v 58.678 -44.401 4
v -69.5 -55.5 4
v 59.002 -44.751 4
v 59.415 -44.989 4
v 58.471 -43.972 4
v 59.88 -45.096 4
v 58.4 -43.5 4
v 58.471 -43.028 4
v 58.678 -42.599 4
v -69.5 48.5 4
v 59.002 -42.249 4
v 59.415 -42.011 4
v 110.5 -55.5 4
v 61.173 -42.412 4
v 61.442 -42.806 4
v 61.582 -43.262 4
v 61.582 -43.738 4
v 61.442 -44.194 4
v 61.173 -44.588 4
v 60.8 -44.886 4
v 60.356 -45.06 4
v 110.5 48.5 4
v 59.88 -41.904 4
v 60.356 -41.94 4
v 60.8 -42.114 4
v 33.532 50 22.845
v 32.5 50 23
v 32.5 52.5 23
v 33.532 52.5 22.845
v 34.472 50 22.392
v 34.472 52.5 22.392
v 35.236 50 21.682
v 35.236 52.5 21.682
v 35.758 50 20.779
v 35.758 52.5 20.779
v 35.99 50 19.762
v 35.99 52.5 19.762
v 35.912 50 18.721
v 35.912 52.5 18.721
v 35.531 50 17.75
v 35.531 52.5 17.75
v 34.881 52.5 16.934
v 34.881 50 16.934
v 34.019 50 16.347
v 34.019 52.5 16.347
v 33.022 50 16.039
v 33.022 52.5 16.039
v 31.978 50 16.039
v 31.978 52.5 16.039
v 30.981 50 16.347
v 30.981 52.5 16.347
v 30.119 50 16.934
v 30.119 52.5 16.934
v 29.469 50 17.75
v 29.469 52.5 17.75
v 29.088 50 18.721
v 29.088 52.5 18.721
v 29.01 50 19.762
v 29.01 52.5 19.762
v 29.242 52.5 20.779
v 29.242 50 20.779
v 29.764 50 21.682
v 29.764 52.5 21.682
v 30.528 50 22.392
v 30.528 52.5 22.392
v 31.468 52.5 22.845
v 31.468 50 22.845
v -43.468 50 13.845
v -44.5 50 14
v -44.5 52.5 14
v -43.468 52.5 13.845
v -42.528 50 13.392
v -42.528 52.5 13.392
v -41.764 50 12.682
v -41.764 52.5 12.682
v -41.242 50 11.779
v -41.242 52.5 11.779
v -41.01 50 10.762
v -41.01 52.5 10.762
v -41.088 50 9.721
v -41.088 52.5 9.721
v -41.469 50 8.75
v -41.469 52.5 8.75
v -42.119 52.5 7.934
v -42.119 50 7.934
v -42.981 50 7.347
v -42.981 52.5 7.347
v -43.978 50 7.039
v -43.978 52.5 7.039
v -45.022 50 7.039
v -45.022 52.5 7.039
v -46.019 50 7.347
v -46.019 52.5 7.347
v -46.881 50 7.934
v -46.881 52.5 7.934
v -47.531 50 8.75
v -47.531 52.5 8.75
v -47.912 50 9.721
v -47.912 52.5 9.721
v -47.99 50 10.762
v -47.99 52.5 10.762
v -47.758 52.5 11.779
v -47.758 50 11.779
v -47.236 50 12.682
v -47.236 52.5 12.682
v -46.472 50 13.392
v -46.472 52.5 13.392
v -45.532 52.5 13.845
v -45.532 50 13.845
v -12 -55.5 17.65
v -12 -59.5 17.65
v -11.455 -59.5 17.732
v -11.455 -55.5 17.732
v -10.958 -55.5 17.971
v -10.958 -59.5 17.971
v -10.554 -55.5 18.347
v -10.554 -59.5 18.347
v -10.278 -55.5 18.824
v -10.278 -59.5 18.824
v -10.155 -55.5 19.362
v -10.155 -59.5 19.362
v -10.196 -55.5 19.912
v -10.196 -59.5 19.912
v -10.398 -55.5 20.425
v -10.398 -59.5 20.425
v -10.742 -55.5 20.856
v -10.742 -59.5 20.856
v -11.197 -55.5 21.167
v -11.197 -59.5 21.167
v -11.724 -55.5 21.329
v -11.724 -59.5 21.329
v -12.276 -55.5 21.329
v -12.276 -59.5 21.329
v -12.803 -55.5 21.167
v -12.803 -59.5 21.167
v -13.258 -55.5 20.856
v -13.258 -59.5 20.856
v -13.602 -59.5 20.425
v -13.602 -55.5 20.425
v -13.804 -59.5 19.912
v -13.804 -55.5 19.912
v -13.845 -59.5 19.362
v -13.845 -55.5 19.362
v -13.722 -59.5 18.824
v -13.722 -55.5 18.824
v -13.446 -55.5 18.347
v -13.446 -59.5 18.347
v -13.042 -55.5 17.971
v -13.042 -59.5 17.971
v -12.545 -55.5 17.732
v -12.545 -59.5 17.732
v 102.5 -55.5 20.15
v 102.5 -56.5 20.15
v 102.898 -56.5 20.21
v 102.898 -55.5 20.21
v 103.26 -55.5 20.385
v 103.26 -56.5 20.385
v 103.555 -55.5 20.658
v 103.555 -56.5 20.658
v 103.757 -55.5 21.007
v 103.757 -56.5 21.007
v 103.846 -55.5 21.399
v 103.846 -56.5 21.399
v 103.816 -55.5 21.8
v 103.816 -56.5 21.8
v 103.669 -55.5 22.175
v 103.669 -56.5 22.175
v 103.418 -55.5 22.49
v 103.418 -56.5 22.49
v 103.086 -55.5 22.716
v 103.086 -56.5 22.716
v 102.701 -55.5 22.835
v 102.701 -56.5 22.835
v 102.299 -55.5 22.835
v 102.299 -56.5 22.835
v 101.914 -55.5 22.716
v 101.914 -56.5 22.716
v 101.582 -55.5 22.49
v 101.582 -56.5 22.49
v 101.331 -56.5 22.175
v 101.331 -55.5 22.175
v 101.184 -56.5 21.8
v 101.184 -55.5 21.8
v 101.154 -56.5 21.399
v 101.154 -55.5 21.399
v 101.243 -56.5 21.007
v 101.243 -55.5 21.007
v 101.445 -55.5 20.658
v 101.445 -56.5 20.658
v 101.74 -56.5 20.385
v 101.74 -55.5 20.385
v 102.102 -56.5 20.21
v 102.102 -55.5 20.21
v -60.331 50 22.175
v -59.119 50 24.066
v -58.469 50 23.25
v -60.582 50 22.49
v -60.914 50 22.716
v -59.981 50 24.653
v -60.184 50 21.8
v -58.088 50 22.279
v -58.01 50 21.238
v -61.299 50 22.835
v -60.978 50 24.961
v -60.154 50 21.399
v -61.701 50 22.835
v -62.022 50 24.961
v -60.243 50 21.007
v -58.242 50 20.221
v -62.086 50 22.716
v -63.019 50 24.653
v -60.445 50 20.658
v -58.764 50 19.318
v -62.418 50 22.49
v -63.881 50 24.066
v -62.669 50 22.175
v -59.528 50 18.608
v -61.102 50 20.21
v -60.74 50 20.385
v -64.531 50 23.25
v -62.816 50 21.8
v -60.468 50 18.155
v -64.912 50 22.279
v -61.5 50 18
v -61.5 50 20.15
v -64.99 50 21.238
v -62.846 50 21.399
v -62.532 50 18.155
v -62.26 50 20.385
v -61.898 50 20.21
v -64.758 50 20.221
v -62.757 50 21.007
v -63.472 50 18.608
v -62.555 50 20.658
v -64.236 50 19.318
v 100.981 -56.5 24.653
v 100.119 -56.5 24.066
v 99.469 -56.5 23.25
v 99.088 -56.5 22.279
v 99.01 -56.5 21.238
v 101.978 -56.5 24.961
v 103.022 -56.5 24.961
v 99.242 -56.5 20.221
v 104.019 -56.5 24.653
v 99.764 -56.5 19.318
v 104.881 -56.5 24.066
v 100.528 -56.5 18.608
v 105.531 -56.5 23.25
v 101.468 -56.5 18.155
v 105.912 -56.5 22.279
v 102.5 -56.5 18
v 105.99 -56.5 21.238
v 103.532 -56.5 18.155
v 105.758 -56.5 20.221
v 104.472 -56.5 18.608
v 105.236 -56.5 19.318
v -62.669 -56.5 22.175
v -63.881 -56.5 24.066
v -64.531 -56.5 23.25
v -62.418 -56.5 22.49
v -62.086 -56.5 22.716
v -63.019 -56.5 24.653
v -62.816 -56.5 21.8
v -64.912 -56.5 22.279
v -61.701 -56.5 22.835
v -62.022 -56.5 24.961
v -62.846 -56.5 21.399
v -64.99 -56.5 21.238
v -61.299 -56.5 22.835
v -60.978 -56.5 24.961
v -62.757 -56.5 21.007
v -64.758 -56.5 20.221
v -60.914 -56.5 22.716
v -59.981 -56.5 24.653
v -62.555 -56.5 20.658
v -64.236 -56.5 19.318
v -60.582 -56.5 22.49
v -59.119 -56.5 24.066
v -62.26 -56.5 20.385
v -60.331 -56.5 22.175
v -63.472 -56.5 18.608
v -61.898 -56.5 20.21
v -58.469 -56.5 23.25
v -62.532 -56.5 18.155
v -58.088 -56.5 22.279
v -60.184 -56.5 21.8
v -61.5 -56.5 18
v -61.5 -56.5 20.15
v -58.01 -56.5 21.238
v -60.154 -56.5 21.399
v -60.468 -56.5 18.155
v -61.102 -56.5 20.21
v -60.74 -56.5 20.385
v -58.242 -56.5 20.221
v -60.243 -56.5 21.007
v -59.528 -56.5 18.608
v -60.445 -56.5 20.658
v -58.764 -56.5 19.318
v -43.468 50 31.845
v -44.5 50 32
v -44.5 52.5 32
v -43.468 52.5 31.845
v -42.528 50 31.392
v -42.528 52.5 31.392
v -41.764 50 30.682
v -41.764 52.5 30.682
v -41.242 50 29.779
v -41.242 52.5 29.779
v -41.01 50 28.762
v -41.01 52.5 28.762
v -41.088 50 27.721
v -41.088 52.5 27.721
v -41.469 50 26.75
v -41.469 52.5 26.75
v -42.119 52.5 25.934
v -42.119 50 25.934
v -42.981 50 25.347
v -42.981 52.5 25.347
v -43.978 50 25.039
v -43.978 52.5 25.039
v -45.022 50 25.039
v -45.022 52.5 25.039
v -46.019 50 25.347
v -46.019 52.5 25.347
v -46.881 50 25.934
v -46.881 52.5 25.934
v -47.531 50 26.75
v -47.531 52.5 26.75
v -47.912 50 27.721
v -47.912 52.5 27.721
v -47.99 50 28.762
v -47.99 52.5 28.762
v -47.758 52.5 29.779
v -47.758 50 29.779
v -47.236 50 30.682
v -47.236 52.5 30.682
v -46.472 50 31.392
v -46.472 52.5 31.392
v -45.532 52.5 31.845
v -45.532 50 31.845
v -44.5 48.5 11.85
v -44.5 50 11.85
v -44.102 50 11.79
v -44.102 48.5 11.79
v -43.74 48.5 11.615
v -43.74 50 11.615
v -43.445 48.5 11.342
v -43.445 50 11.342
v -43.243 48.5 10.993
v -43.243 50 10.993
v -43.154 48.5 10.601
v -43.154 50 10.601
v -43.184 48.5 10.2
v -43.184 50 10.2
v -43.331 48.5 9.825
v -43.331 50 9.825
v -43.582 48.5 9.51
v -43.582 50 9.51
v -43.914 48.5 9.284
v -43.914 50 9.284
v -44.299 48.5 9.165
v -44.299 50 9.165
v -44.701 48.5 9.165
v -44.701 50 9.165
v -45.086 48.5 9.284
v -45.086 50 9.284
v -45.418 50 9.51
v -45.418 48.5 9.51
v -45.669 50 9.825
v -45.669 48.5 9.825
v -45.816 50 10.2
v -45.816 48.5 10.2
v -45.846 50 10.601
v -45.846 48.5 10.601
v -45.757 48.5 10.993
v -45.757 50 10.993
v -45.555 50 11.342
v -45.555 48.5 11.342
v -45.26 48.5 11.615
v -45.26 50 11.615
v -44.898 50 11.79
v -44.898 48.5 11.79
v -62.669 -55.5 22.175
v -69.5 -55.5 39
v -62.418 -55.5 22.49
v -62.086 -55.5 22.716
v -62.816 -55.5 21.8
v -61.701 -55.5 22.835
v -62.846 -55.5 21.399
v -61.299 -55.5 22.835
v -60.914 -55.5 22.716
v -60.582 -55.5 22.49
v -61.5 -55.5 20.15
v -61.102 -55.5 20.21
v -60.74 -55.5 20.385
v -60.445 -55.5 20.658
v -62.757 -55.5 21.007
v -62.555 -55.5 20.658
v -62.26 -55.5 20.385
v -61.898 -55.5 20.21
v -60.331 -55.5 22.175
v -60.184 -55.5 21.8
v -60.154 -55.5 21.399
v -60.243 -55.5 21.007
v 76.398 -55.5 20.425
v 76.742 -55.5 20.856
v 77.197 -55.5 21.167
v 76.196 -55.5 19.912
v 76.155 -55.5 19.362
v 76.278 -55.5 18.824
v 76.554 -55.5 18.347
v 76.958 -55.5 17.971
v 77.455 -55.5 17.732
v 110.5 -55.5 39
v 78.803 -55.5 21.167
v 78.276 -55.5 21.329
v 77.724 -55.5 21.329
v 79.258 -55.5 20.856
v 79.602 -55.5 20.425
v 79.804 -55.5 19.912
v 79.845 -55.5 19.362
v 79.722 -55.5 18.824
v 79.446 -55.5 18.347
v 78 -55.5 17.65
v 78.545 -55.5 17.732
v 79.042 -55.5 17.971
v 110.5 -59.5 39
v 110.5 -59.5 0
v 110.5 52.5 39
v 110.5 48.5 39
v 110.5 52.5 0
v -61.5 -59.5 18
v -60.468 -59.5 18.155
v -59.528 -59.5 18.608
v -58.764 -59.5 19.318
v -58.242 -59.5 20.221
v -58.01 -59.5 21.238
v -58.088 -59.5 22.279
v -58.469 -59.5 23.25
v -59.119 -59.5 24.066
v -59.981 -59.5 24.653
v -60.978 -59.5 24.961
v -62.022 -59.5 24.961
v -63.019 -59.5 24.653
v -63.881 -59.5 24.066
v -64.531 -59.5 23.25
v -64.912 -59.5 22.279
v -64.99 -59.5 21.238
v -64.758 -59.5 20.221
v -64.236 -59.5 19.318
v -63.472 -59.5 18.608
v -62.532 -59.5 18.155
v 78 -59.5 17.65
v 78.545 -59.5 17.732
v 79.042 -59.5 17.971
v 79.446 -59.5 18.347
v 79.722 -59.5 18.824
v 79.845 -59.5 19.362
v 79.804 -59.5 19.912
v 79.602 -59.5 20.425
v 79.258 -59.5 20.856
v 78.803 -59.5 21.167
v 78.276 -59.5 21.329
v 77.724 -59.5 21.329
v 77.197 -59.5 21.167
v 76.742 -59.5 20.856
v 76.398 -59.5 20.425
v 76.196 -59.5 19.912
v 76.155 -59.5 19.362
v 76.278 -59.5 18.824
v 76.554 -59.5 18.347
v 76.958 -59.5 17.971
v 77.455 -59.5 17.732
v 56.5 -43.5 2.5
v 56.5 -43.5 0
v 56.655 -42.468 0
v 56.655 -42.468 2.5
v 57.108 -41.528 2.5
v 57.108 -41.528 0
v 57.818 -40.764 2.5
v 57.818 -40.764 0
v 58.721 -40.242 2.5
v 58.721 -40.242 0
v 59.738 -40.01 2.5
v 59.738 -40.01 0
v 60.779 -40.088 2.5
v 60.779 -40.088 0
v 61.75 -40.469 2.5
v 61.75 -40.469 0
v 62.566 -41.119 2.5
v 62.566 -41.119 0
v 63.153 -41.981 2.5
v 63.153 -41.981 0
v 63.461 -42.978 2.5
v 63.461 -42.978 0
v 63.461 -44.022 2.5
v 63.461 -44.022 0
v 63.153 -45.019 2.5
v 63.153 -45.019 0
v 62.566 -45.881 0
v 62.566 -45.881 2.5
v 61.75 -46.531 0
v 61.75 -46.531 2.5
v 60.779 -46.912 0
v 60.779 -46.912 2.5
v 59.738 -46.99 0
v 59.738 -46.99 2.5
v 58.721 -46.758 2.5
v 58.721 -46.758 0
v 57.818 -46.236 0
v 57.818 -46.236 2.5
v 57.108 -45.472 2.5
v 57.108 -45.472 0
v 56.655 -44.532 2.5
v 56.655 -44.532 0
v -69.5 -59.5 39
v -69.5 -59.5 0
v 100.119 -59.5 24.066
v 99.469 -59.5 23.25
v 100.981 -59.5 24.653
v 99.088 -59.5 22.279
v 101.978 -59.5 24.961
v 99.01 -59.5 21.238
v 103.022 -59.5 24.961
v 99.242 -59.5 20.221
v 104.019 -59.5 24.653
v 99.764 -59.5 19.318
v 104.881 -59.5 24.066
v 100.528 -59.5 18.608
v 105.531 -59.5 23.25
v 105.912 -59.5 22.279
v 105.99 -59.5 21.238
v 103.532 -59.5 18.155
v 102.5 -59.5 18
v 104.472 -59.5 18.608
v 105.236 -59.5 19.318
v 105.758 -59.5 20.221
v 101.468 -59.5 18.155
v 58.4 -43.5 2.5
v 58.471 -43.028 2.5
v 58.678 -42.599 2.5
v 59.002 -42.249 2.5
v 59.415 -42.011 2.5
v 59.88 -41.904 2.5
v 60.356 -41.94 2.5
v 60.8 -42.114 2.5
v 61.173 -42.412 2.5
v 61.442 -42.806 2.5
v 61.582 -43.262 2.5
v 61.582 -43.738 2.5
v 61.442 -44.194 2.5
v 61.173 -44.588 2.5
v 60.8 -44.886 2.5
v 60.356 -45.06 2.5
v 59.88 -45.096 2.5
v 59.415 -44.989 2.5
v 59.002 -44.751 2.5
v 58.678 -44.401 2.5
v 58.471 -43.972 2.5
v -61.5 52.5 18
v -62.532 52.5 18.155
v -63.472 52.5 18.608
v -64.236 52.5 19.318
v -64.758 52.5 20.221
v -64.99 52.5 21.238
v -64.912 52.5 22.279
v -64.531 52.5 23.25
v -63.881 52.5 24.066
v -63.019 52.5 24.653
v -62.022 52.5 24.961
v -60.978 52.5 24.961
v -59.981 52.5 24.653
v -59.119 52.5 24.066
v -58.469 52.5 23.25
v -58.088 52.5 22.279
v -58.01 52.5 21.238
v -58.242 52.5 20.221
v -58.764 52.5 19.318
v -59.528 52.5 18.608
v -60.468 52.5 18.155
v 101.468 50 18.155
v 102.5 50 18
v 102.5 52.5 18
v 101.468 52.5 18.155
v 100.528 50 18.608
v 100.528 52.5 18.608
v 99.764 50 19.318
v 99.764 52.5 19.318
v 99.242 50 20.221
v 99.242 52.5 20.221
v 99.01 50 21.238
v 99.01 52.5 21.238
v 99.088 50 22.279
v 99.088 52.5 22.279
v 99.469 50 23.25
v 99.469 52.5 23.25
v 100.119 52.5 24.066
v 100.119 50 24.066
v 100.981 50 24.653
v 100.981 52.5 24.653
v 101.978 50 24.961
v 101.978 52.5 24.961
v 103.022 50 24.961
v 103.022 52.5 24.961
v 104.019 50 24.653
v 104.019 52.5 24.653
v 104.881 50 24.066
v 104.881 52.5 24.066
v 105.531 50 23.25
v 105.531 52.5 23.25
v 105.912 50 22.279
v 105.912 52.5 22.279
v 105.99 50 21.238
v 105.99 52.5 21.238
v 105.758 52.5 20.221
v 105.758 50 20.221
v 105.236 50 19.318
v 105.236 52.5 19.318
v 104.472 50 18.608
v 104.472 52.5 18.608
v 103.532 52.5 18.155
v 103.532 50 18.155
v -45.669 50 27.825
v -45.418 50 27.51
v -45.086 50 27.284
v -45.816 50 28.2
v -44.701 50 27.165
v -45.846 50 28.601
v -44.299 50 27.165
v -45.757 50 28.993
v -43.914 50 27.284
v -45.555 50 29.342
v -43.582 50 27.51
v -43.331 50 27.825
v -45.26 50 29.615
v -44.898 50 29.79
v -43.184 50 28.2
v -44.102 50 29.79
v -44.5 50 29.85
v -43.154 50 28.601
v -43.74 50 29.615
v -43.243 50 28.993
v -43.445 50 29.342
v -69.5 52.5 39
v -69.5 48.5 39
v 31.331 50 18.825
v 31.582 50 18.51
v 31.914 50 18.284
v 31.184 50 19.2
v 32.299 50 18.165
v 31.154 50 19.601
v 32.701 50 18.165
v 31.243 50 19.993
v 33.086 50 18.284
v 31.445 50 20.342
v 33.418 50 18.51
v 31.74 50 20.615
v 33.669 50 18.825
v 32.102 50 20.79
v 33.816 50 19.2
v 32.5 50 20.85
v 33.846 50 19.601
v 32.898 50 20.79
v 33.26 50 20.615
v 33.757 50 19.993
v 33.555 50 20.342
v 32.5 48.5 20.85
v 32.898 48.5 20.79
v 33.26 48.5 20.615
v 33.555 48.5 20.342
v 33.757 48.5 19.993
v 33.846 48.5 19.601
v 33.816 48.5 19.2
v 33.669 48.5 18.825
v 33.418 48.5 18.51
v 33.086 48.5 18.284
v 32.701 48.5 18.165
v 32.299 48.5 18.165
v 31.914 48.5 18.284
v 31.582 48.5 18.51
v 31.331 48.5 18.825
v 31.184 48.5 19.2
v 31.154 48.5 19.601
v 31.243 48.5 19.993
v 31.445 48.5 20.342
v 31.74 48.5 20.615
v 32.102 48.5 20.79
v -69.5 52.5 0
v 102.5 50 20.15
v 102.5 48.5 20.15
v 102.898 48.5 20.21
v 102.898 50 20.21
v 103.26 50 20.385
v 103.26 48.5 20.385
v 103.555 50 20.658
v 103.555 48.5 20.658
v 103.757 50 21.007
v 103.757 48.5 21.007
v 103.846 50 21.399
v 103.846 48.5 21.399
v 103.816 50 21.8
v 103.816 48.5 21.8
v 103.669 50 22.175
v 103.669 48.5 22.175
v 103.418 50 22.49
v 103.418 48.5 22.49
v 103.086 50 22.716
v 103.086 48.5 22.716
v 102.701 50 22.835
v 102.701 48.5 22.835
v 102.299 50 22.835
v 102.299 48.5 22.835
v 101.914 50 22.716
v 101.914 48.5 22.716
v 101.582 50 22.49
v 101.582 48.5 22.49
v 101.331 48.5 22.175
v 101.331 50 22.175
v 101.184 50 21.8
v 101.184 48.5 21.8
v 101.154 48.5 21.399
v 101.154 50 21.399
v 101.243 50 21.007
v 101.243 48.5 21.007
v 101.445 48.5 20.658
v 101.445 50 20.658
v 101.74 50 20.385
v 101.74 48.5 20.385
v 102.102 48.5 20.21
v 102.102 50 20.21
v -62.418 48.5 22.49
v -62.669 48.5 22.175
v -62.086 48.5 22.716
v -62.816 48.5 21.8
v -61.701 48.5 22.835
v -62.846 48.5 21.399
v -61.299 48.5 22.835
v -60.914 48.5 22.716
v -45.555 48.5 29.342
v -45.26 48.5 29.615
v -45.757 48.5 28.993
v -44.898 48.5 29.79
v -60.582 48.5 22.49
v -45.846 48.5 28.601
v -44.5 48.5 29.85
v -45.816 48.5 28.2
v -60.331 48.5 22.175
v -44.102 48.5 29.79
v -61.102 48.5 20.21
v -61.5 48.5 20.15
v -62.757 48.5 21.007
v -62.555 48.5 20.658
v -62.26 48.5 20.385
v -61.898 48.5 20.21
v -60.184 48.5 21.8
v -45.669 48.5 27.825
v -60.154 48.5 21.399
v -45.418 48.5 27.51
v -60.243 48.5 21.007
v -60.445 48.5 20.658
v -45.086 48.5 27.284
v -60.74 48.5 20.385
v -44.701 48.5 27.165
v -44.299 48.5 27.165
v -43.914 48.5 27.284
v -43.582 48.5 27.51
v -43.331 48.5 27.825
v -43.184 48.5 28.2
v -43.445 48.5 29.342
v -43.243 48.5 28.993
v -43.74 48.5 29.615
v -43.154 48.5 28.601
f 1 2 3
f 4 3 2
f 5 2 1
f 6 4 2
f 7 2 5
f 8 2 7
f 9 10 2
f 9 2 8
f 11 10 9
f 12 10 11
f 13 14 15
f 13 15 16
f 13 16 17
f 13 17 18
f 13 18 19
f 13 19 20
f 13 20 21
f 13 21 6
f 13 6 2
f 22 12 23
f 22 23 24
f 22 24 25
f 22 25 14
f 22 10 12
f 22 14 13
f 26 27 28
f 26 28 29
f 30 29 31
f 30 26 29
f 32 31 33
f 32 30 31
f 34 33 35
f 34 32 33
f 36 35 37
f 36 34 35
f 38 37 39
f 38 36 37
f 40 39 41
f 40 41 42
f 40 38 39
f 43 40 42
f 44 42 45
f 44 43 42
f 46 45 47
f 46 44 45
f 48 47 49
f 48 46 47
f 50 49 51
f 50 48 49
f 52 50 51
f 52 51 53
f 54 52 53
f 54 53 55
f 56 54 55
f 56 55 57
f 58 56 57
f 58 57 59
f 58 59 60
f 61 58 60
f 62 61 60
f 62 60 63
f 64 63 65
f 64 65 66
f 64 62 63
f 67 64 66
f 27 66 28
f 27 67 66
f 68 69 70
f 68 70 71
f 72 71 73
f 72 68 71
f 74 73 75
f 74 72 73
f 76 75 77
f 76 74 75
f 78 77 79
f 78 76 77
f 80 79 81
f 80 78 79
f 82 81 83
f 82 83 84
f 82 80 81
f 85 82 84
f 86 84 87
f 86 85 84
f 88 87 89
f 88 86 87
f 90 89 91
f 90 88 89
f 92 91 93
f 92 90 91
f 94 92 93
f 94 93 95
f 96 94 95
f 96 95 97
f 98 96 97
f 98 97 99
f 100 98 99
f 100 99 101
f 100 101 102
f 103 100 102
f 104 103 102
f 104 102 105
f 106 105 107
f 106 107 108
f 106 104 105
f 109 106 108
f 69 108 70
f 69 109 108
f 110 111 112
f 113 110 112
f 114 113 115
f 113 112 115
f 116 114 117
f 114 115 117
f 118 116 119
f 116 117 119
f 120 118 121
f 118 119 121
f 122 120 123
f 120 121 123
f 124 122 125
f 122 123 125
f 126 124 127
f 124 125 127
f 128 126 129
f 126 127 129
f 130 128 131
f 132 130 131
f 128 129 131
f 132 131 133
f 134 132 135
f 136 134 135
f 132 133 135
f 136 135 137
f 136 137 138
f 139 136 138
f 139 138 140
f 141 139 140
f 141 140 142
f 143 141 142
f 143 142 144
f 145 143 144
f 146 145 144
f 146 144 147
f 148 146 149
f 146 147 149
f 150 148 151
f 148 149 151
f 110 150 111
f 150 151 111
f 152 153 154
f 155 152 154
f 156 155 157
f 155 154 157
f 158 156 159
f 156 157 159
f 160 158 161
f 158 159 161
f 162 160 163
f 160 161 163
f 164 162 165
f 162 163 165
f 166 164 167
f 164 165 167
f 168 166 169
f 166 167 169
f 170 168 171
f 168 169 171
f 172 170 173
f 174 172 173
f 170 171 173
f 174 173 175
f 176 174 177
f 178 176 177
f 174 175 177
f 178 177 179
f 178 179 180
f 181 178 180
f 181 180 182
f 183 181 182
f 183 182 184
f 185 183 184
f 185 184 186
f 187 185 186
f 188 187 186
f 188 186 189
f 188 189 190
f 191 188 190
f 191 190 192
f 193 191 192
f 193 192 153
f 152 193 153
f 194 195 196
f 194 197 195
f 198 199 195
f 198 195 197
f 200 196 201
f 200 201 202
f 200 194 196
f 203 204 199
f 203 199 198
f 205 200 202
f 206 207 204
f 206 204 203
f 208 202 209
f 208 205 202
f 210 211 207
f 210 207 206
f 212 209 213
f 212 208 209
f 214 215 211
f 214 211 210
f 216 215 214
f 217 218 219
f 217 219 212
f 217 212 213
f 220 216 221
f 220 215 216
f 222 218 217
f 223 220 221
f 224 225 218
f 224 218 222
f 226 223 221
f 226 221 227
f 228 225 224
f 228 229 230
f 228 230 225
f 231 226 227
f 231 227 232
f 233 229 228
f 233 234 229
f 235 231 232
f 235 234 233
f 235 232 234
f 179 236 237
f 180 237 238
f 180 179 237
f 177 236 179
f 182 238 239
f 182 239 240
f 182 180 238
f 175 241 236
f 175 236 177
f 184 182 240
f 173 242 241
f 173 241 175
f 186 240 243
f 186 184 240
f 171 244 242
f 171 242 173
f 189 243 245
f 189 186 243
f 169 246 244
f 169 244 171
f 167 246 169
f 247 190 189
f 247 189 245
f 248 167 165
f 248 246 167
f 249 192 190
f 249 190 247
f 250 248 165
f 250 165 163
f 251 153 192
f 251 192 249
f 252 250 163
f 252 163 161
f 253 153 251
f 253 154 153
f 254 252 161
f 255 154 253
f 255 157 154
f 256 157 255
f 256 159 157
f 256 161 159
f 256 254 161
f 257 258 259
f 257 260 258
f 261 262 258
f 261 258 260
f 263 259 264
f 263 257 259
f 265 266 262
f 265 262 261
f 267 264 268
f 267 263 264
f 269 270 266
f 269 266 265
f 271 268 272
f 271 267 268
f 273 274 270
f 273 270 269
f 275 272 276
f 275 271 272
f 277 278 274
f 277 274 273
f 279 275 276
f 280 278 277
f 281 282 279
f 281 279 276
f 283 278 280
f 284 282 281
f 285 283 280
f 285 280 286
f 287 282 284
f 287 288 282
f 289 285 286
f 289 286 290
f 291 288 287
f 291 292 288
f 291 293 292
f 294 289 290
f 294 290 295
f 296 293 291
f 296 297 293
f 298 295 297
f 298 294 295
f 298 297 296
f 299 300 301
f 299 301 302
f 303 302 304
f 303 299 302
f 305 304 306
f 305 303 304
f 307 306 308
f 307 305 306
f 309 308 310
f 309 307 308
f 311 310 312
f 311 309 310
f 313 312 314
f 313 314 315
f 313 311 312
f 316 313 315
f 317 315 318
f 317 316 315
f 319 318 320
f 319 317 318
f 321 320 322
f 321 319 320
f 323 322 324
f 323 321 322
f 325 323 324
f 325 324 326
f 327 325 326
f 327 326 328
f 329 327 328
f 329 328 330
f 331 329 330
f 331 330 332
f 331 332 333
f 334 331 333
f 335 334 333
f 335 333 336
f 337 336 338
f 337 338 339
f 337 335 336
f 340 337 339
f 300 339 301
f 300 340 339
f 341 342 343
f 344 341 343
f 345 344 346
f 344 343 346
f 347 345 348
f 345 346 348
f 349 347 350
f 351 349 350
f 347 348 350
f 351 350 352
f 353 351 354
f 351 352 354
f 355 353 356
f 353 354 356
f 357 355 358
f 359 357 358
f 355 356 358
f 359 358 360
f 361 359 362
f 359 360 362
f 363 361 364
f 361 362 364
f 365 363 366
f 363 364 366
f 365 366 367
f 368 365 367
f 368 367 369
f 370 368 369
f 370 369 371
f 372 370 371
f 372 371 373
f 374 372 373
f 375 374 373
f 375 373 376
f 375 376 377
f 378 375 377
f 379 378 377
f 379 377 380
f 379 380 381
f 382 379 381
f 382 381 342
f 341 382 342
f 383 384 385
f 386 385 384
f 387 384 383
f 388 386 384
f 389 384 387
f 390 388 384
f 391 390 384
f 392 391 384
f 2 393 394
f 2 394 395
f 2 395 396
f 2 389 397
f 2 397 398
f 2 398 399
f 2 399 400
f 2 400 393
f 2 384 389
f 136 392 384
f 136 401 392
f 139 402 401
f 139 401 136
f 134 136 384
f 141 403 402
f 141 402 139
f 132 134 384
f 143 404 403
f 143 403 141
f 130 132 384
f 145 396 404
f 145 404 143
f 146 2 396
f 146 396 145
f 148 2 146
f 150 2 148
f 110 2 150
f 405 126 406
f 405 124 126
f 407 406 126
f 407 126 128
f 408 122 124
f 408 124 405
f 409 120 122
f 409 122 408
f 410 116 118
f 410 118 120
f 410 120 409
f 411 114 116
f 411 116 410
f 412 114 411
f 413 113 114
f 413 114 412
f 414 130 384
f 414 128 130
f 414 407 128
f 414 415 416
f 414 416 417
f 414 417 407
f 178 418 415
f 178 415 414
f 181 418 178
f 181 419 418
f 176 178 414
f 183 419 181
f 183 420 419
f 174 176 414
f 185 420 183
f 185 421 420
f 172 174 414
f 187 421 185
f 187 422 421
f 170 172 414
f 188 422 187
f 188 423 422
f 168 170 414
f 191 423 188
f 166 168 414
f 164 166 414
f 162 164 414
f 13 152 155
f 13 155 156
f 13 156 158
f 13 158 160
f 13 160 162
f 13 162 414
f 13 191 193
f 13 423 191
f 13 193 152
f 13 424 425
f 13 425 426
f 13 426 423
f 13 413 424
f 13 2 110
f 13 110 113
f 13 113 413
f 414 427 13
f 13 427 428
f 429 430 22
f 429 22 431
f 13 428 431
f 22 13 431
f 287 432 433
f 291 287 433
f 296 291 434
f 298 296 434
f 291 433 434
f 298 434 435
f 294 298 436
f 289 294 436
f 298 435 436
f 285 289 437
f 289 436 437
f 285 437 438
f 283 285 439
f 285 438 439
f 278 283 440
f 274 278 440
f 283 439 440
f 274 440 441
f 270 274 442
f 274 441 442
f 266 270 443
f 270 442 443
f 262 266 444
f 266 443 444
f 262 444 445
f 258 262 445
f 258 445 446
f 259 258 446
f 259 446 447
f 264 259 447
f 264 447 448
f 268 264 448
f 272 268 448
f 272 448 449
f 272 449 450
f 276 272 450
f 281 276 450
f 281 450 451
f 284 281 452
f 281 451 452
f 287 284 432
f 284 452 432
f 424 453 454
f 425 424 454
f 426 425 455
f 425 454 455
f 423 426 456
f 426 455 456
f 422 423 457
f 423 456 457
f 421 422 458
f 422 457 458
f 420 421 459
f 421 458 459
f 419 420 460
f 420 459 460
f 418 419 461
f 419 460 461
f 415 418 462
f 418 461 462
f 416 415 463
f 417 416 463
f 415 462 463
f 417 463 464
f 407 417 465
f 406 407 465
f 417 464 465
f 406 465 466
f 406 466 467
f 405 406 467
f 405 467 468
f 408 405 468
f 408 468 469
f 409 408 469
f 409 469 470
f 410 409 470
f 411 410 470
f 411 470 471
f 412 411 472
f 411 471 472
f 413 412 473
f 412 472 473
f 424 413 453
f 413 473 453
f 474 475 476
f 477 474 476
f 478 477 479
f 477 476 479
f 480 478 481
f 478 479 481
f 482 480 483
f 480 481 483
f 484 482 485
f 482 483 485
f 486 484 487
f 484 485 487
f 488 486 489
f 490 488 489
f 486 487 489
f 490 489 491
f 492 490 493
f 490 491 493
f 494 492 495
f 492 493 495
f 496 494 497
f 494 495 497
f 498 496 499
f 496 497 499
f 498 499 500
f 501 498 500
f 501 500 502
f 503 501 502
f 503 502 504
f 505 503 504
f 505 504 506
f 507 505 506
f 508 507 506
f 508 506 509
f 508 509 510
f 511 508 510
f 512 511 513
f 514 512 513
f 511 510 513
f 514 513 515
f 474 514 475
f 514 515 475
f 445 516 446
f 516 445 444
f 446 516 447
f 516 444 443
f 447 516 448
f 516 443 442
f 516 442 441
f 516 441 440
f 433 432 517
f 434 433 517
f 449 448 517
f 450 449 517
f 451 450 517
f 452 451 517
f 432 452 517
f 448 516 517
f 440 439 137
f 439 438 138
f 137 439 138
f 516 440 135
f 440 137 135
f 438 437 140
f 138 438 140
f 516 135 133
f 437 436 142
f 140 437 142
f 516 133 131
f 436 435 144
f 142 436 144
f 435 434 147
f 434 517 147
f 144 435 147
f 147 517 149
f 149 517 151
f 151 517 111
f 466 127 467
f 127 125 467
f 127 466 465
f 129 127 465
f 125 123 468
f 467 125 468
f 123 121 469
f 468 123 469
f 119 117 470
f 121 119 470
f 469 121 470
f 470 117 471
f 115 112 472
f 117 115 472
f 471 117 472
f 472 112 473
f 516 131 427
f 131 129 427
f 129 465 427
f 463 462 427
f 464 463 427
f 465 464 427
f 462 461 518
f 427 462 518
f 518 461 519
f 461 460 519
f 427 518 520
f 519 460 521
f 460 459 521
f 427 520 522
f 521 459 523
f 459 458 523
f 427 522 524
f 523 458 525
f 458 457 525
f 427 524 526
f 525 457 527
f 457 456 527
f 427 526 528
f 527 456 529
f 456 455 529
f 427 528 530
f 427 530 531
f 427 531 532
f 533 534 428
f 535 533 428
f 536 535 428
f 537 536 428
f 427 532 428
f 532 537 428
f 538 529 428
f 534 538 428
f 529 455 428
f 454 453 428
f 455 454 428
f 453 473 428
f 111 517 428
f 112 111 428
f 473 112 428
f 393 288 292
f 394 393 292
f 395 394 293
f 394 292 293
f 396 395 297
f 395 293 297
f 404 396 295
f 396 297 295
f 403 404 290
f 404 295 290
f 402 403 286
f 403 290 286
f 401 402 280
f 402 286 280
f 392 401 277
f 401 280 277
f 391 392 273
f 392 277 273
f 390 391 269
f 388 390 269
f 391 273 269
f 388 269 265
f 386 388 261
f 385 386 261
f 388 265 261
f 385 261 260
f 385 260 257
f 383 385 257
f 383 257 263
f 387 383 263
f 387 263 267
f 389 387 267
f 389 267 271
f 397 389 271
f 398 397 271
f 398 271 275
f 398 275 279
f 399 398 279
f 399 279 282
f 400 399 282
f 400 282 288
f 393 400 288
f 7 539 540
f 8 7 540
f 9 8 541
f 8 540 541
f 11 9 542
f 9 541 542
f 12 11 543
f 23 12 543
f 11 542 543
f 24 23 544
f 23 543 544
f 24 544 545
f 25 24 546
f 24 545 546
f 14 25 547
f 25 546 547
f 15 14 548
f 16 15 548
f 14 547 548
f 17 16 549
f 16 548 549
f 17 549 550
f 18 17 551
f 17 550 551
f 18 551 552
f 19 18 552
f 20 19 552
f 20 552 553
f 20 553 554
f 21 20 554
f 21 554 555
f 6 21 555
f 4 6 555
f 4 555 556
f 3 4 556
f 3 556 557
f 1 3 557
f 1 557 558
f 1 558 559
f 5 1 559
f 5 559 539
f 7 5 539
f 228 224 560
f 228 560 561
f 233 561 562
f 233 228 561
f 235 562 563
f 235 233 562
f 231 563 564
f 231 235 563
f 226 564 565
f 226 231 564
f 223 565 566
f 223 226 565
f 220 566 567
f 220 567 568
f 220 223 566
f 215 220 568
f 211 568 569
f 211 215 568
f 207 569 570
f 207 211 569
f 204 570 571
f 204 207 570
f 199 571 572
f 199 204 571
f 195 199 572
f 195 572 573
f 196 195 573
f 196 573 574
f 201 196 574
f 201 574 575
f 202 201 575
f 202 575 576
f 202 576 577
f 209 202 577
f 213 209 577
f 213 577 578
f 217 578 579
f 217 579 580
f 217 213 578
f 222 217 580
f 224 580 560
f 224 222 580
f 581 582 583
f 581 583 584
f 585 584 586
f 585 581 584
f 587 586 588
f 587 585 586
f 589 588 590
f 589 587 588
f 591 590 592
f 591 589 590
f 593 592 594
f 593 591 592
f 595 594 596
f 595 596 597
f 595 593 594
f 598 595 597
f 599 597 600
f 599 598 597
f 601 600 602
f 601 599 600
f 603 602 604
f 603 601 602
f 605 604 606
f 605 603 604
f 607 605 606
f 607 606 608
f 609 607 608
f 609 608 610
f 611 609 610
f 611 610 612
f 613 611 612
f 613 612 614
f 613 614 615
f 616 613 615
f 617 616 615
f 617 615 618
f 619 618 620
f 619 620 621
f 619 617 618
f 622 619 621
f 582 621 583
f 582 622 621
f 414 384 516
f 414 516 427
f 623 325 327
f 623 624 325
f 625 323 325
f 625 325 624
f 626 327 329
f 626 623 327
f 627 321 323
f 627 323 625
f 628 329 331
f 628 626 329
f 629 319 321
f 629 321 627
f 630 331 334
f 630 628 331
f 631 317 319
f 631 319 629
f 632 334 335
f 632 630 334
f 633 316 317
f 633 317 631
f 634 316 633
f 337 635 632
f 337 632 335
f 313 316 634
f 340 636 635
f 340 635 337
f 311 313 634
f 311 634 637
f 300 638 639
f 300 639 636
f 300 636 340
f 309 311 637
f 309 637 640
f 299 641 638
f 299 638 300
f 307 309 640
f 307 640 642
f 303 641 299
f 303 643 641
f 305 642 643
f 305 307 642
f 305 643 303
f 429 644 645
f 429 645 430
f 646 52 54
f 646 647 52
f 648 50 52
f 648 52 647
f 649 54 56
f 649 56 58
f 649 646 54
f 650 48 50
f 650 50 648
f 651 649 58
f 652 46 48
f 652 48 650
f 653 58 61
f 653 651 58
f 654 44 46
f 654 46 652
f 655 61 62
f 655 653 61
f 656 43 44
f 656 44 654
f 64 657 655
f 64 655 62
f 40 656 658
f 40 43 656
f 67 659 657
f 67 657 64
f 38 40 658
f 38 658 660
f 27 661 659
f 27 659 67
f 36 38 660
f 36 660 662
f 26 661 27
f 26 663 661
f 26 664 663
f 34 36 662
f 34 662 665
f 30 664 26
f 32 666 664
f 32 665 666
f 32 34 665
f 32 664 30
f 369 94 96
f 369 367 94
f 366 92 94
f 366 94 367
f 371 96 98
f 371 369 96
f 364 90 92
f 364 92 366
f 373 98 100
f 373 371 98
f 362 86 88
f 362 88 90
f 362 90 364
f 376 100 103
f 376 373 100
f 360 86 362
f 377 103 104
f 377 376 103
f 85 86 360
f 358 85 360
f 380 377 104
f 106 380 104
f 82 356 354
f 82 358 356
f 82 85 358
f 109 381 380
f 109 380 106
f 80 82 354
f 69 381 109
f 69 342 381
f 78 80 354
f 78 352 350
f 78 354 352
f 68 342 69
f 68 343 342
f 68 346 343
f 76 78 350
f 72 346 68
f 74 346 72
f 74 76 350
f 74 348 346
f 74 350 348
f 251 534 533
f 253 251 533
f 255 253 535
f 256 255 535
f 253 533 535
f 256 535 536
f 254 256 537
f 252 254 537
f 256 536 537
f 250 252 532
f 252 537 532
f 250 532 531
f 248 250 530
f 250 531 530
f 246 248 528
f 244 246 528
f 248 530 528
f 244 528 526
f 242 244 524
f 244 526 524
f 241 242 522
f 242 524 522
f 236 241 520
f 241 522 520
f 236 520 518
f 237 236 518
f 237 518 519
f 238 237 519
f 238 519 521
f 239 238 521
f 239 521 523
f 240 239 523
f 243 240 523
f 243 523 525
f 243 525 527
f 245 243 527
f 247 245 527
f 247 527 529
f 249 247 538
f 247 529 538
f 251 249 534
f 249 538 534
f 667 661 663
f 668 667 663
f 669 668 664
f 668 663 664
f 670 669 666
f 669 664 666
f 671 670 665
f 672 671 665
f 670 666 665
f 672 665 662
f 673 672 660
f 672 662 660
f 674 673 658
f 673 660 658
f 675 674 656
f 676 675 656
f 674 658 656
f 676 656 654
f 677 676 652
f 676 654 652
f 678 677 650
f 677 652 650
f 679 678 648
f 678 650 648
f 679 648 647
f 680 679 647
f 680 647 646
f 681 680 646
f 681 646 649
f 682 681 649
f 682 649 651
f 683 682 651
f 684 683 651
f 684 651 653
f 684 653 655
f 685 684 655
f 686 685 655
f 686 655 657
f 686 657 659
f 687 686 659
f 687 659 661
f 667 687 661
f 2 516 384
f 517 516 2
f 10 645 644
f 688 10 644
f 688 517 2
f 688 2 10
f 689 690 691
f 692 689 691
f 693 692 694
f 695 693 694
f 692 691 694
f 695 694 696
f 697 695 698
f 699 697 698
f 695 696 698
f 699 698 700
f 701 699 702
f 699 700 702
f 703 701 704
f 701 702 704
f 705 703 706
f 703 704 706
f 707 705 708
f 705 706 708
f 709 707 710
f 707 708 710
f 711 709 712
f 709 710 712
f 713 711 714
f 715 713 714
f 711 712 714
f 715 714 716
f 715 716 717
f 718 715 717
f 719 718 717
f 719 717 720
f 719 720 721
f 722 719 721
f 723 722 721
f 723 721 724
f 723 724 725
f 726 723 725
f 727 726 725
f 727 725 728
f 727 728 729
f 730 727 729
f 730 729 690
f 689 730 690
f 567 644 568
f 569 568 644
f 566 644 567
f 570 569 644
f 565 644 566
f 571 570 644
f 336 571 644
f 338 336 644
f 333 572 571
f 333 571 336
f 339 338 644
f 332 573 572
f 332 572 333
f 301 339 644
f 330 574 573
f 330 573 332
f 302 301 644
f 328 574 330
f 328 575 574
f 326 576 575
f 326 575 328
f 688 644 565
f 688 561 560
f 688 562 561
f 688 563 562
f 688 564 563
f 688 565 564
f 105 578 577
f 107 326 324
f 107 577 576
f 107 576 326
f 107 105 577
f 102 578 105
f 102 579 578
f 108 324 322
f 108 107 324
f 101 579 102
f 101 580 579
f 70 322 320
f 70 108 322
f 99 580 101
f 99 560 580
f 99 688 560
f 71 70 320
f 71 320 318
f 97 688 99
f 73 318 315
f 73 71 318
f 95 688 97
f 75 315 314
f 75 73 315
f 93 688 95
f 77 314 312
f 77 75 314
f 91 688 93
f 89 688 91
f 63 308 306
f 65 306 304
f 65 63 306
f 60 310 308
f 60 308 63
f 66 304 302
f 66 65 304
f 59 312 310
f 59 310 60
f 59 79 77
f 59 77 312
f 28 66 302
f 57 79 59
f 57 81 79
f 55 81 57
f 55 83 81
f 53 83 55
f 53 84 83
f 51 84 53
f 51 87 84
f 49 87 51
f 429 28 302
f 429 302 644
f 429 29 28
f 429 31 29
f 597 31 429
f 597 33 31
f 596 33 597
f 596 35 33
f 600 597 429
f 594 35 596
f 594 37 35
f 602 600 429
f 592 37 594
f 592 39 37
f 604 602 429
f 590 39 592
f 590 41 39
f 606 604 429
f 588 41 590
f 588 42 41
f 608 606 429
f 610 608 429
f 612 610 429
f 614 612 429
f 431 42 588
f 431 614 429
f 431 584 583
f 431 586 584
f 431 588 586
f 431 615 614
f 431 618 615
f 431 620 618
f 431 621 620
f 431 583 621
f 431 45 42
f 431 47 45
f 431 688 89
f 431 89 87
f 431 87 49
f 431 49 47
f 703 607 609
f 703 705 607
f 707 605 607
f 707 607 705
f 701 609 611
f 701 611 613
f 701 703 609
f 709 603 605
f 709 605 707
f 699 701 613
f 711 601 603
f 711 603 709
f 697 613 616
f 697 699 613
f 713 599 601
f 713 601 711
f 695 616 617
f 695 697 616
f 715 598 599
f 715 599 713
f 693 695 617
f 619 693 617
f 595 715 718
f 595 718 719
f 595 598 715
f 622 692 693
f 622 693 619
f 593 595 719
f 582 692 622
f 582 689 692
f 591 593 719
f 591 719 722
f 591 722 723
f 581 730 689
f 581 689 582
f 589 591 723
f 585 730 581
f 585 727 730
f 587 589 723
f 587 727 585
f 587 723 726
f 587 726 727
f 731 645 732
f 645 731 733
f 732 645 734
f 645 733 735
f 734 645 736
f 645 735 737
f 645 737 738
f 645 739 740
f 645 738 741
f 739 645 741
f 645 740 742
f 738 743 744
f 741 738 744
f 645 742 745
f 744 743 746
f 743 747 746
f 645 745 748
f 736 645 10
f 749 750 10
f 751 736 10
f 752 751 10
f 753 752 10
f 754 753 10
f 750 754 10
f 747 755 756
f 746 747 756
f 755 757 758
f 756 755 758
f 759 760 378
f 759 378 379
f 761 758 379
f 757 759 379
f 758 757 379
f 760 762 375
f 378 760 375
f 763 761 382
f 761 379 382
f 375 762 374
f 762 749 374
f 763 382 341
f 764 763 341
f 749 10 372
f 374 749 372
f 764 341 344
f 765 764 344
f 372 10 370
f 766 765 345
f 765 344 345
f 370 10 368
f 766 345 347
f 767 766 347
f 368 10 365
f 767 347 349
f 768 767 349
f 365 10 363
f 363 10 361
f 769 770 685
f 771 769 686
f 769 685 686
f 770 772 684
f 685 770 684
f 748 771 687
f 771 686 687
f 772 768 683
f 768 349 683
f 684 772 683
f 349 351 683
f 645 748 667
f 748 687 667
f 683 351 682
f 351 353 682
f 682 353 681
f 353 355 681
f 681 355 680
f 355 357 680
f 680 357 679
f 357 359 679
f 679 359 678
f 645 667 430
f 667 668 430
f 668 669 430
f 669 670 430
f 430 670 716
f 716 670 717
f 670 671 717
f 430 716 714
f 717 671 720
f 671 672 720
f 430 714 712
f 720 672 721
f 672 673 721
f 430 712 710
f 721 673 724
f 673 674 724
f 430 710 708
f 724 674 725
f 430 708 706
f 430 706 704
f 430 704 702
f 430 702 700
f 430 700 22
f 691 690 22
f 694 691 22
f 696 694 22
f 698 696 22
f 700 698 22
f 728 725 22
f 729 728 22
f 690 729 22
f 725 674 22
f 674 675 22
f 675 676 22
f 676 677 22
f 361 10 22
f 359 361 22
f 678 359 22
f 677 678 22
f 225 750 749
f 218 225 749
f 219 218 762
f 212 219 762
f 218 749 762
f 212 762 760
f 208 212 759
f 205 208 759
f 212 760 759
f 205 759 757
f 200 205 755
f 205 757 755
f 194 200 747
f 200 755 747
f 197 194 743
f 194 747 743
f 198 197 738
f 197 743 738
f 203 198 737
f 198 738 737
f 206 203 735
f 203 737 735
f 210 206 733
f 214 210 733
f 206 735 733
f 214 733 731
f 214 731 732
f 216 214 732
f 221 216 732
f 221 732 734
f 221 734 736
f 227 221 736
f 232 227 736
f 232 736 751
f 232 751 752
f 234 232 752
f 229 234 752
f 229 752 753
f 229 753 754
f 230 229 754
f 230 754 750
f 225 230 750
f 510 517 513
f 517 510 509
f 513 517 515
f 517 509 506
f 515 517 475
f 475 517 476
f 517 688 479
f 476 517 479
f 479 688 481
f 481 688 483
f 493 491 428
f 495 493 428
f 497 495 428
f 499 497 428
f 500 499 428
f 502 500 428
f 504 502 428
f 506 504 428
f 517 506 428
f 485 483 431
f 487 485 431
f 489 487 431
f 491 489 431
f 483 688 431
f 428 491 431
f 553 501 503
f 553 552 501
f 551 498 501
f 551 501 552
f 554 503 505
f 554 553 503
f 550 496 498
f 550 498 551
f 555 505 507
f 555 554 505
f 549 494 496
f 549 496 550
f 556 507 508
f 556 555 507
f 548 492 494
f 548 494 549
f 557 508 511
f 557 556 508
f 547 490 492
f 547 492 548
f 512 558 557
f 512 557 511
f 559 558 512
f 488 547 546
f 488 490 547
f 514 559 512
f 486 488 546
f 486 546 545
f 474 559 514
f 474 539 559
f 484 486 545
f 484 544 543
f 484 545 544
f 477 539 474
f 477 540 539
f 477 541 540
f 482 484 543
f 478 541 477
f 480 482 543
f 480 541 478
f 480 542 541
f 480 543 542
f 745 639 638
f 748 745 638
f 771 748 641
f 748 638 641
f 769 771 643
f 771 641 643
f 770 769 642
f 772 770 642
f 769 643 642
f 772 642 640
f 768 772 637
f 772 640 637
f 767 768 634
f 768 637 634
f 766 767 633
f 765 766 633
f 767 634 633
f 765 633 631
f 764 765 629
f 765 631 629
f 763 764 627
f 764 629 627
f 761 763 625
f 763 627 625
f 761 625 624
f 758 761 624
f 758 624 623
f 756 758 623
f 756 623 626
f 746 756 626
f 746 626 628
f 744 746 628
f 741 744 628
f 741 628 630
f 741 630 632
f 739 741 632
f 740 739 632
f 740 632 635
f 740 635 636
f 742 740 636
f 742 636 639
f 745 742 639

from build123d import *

# Parameters (mm, degrees)
SKICA1_W                 = 180
SKICA1_H                 = 112
P_IDAT_VYSUNUT_M1_DEPTH  = 4
SKICA3_W                 = 180
SKICA3_H                 = 4
P_IDAT_VYSUNUT_M2_DEPTH  = 35
SKICA4_R                 = 1.35
ODEBRAT_VYSUNUT_M1_DEPTH = 4
ODEBRAT_VYSUNUT_M2_REACH = 164.096
SKICA6_R                 = 1.35
SKICA7_R                 = 3.5
ODEBRAT_VYSUNUT_M3_DEPTH = 3
SKICA8_R                 = 1.85
ODEBRAT_VYSUNUT_M4_DEPTH = 4
ODEBRAT_START            = -2.5
SKICA9_R                 = 3.5
ODEBRAT_VYSUNUT_M5_DEPTH = 2.5
SKICA10_R                = 1.6
ODEBRAT_VYSUNUT_M6_DEPTH = 4
SKICA11_R                = 3.5
ODEBRAT_VYSUNUT_M7_DEPTH = 2.5


with BuildPart() as part:
    # Skica1 → Přidat vysunutím1 (new body)
    with BuildSketch(Plane.XY):
        with Locations((20.5, -3.5)):
            Rectangle(SKICA1_W, SKICA1_H)
    extrude(amount=P_IDAT_VYSUNUT_M1_DEPTH)

    # Skica3 → Přidat vysunutím2 (add)
    with BuildSketch(Plane.XY.offset(4)):
        with Locations((20.5, 50.5)):
            Rectangle(SKICA3_W, SKICA3_H)
        with Locations((20.5, -57.5)):
            Rectangle(SKICA3_W, SKICA3_H)
    extrude(amount=P_IDAT_VYSUNUT_M2_DEPTH)

    # Skica4 → Odebrat vysunutím1 (cut)
    with BuildSketch(Plane(origin=(0, 52.5, 0), x_dir=(1, 0, 0), z_dir=(0, 1, 0))):
        with Locations(Location((32.5, -19.5, 0), (0, 0, 270))):
            Circle(SKICA4_R)
        with Locations(Location((-44.5, -10.5, 0), (0, 0, 270))):
            Circle(SKICA4_R)
        with Locations(Location((-44.5, -28.5, 0), (0, 0, 270))):
            Circle(SKICA4_R)
    extrude(amount=-ODEBRAT_VYSUNUT_M1_DEPTH, mode=Mode.SUBTRACT)

    # Odebrat vysunutím2: up to this face of the body (flat: up to its plane)
    odebrat_vysunut_m2_end = Plane(part.part.faces().sort_by_distance((20.596477546, 52.5, 19.5))[0])
    # Skica6 → Odebrat vysunutím2 (cut, up to the picked face)
    with BuildSketch(Plane.XZ.offset(59.5), mode=Mode.PRIVATE) as odebrat_vysunut_m2_sk1:
        with Locations(Location((102.5, 21.5, 0), (0, 0, 270))):
            Circle(SKICA6_R)
    odebrat_vysunut_m2_tool1 = split(extrude(odebrat_vysunut_m2_sk1.sketch, amount=-ODEBRAT_VYSUNUT_M2_REACH, mode=Mode.PRIVATE), bisect_by=odebrat_vysunut_m2_end, keep=Keep.BOTH, mode=Mode.PRIVATE)
    # Skica6 → Odebrat vysunutím2 (cut, up to the picked face)
    with BuildSketch(Plane.XZ.offset(59.5), mode=Mode.PRIVATE) as odebrat_vysunut_m2_sk2:
        with Locations(Location((-61.5, 21.5, 0), (0, 0, 270))):
            Circle(SKICA6_R)
    odebrat_vysunut_m2_tool2 = split(extrude(odebrat_vysunut_m2_sk2.sketch, amount=-ODEBRAT_VYSUNUT_M2_REACH, mode=Mode.PRIVATE), bisect_by=odebrat_vysunut_m2_end, keep=Keep.BOTH, mode=Mode.PRIVATE)
    add(odebrat_vysunut_m2_tool1.solids().sort_by(Axis((102.5, -59.5, 21.5), (0, 1, 0)))[0], mode=Mode.SUBTRACT)
    add(odebrat_vysunut_m2_tool2.solids().sort_by(Axis((-61.5, -59.5, 21.5), (0, 1, 0)))[0], mode=Mode.SUBTRACT)

    # Skica7 → Odebrat vysunutím3 (cut)
    with BuildSketch(Plane.XZ.offset(59.5)):
        with Locations(Location((-61.5, 21.5, 0), (0, 0, 270))):
            Circle(SKICA7_R)
        with Locations(Location((102.5, 21.5, 0), (0, 0, 270))):
            Circle(SKICA7_R)
    extrude(amount=-ODEBRAT_VYSUNUT_M3_DEPTH, mode=Mode.SUBTRACT)

    # Skica8 → Odebrat vysunutím4 (cut)
    with BuildSketch(Plane.XZ.offset(59.5)):
        with Locations(Location((-12, 19.5, 0), (0, 0, 270))):
            Circle(SKICA8_R)
        with Locations(Location((78, 19.5, 0), (0, 0, 270))):
            Circle(SKICA8_R)
    extrude(amount=-ODEBRAT_VYSUNUT_M4_DEPTH, mode=Mode.SUBTRACT)

    # Skica9 → Odebrat vysunutím5 (cut)
    with BuildSketch(Plane(origin=(0, 52.5, 0), x_dir=(1, 0, 0), z_dir=(0, 1, 0)).offset(ODEBRAT_START)):
        with Locations(Location((-61.5, -21.5, 0), (0, 0, 90))):
            Circle(SKICA9_R)
        with Locations(Location((-44.5, -10.5, 0), (0, 0, 270))):
            Circle(SKICA9_R)
        with Locations(Location((-44.5, -28.5, 0), (0, 0, 270))):
            Circle(SKICA9_R)
        with Locations(Location((32.5, -19.5, 0), (0, 0, 270))):
            Circle(SKICA9_R)
        with Locations(Location((102.5, -21.5, 0), (0, 0, 90))):
            Circle(SKICA9_R)
    extrude(amount=ODEBRAT_VYSUNUT_M5_DEPTH, mode=Mode.SUBTRACT)

    # Skica10 → Odebrat vysunutím6 (cut)
    with BuildSketch(Plane(origin=(0, 0, 0), x_dir=(-1, 0, 0), z_dir=(0, 0, -1))):
        with Locations((-60, -43.5)):
            Circle(SKICA10_R)
    extrude(amount=-ODEBRAT_VYSUNUT_M6_DEPTH, mode=Mode.SUBTRACT)

    # Skica11 → Odebrat vysunutím7 (cut)
    with BuildSketch(Plane(origin=(0, 0, 0), x_dir=(-1, 0, 0), z_dir=(0, 0, -1))):
        with Locations((-60, -43.5)):
            Circle(SKICA11_R)
    extrude(amount=-ODEBRAT_VYSUNUT_M7_DEPTH, mode=Mode.SUBTRACT)


solid = part.part
